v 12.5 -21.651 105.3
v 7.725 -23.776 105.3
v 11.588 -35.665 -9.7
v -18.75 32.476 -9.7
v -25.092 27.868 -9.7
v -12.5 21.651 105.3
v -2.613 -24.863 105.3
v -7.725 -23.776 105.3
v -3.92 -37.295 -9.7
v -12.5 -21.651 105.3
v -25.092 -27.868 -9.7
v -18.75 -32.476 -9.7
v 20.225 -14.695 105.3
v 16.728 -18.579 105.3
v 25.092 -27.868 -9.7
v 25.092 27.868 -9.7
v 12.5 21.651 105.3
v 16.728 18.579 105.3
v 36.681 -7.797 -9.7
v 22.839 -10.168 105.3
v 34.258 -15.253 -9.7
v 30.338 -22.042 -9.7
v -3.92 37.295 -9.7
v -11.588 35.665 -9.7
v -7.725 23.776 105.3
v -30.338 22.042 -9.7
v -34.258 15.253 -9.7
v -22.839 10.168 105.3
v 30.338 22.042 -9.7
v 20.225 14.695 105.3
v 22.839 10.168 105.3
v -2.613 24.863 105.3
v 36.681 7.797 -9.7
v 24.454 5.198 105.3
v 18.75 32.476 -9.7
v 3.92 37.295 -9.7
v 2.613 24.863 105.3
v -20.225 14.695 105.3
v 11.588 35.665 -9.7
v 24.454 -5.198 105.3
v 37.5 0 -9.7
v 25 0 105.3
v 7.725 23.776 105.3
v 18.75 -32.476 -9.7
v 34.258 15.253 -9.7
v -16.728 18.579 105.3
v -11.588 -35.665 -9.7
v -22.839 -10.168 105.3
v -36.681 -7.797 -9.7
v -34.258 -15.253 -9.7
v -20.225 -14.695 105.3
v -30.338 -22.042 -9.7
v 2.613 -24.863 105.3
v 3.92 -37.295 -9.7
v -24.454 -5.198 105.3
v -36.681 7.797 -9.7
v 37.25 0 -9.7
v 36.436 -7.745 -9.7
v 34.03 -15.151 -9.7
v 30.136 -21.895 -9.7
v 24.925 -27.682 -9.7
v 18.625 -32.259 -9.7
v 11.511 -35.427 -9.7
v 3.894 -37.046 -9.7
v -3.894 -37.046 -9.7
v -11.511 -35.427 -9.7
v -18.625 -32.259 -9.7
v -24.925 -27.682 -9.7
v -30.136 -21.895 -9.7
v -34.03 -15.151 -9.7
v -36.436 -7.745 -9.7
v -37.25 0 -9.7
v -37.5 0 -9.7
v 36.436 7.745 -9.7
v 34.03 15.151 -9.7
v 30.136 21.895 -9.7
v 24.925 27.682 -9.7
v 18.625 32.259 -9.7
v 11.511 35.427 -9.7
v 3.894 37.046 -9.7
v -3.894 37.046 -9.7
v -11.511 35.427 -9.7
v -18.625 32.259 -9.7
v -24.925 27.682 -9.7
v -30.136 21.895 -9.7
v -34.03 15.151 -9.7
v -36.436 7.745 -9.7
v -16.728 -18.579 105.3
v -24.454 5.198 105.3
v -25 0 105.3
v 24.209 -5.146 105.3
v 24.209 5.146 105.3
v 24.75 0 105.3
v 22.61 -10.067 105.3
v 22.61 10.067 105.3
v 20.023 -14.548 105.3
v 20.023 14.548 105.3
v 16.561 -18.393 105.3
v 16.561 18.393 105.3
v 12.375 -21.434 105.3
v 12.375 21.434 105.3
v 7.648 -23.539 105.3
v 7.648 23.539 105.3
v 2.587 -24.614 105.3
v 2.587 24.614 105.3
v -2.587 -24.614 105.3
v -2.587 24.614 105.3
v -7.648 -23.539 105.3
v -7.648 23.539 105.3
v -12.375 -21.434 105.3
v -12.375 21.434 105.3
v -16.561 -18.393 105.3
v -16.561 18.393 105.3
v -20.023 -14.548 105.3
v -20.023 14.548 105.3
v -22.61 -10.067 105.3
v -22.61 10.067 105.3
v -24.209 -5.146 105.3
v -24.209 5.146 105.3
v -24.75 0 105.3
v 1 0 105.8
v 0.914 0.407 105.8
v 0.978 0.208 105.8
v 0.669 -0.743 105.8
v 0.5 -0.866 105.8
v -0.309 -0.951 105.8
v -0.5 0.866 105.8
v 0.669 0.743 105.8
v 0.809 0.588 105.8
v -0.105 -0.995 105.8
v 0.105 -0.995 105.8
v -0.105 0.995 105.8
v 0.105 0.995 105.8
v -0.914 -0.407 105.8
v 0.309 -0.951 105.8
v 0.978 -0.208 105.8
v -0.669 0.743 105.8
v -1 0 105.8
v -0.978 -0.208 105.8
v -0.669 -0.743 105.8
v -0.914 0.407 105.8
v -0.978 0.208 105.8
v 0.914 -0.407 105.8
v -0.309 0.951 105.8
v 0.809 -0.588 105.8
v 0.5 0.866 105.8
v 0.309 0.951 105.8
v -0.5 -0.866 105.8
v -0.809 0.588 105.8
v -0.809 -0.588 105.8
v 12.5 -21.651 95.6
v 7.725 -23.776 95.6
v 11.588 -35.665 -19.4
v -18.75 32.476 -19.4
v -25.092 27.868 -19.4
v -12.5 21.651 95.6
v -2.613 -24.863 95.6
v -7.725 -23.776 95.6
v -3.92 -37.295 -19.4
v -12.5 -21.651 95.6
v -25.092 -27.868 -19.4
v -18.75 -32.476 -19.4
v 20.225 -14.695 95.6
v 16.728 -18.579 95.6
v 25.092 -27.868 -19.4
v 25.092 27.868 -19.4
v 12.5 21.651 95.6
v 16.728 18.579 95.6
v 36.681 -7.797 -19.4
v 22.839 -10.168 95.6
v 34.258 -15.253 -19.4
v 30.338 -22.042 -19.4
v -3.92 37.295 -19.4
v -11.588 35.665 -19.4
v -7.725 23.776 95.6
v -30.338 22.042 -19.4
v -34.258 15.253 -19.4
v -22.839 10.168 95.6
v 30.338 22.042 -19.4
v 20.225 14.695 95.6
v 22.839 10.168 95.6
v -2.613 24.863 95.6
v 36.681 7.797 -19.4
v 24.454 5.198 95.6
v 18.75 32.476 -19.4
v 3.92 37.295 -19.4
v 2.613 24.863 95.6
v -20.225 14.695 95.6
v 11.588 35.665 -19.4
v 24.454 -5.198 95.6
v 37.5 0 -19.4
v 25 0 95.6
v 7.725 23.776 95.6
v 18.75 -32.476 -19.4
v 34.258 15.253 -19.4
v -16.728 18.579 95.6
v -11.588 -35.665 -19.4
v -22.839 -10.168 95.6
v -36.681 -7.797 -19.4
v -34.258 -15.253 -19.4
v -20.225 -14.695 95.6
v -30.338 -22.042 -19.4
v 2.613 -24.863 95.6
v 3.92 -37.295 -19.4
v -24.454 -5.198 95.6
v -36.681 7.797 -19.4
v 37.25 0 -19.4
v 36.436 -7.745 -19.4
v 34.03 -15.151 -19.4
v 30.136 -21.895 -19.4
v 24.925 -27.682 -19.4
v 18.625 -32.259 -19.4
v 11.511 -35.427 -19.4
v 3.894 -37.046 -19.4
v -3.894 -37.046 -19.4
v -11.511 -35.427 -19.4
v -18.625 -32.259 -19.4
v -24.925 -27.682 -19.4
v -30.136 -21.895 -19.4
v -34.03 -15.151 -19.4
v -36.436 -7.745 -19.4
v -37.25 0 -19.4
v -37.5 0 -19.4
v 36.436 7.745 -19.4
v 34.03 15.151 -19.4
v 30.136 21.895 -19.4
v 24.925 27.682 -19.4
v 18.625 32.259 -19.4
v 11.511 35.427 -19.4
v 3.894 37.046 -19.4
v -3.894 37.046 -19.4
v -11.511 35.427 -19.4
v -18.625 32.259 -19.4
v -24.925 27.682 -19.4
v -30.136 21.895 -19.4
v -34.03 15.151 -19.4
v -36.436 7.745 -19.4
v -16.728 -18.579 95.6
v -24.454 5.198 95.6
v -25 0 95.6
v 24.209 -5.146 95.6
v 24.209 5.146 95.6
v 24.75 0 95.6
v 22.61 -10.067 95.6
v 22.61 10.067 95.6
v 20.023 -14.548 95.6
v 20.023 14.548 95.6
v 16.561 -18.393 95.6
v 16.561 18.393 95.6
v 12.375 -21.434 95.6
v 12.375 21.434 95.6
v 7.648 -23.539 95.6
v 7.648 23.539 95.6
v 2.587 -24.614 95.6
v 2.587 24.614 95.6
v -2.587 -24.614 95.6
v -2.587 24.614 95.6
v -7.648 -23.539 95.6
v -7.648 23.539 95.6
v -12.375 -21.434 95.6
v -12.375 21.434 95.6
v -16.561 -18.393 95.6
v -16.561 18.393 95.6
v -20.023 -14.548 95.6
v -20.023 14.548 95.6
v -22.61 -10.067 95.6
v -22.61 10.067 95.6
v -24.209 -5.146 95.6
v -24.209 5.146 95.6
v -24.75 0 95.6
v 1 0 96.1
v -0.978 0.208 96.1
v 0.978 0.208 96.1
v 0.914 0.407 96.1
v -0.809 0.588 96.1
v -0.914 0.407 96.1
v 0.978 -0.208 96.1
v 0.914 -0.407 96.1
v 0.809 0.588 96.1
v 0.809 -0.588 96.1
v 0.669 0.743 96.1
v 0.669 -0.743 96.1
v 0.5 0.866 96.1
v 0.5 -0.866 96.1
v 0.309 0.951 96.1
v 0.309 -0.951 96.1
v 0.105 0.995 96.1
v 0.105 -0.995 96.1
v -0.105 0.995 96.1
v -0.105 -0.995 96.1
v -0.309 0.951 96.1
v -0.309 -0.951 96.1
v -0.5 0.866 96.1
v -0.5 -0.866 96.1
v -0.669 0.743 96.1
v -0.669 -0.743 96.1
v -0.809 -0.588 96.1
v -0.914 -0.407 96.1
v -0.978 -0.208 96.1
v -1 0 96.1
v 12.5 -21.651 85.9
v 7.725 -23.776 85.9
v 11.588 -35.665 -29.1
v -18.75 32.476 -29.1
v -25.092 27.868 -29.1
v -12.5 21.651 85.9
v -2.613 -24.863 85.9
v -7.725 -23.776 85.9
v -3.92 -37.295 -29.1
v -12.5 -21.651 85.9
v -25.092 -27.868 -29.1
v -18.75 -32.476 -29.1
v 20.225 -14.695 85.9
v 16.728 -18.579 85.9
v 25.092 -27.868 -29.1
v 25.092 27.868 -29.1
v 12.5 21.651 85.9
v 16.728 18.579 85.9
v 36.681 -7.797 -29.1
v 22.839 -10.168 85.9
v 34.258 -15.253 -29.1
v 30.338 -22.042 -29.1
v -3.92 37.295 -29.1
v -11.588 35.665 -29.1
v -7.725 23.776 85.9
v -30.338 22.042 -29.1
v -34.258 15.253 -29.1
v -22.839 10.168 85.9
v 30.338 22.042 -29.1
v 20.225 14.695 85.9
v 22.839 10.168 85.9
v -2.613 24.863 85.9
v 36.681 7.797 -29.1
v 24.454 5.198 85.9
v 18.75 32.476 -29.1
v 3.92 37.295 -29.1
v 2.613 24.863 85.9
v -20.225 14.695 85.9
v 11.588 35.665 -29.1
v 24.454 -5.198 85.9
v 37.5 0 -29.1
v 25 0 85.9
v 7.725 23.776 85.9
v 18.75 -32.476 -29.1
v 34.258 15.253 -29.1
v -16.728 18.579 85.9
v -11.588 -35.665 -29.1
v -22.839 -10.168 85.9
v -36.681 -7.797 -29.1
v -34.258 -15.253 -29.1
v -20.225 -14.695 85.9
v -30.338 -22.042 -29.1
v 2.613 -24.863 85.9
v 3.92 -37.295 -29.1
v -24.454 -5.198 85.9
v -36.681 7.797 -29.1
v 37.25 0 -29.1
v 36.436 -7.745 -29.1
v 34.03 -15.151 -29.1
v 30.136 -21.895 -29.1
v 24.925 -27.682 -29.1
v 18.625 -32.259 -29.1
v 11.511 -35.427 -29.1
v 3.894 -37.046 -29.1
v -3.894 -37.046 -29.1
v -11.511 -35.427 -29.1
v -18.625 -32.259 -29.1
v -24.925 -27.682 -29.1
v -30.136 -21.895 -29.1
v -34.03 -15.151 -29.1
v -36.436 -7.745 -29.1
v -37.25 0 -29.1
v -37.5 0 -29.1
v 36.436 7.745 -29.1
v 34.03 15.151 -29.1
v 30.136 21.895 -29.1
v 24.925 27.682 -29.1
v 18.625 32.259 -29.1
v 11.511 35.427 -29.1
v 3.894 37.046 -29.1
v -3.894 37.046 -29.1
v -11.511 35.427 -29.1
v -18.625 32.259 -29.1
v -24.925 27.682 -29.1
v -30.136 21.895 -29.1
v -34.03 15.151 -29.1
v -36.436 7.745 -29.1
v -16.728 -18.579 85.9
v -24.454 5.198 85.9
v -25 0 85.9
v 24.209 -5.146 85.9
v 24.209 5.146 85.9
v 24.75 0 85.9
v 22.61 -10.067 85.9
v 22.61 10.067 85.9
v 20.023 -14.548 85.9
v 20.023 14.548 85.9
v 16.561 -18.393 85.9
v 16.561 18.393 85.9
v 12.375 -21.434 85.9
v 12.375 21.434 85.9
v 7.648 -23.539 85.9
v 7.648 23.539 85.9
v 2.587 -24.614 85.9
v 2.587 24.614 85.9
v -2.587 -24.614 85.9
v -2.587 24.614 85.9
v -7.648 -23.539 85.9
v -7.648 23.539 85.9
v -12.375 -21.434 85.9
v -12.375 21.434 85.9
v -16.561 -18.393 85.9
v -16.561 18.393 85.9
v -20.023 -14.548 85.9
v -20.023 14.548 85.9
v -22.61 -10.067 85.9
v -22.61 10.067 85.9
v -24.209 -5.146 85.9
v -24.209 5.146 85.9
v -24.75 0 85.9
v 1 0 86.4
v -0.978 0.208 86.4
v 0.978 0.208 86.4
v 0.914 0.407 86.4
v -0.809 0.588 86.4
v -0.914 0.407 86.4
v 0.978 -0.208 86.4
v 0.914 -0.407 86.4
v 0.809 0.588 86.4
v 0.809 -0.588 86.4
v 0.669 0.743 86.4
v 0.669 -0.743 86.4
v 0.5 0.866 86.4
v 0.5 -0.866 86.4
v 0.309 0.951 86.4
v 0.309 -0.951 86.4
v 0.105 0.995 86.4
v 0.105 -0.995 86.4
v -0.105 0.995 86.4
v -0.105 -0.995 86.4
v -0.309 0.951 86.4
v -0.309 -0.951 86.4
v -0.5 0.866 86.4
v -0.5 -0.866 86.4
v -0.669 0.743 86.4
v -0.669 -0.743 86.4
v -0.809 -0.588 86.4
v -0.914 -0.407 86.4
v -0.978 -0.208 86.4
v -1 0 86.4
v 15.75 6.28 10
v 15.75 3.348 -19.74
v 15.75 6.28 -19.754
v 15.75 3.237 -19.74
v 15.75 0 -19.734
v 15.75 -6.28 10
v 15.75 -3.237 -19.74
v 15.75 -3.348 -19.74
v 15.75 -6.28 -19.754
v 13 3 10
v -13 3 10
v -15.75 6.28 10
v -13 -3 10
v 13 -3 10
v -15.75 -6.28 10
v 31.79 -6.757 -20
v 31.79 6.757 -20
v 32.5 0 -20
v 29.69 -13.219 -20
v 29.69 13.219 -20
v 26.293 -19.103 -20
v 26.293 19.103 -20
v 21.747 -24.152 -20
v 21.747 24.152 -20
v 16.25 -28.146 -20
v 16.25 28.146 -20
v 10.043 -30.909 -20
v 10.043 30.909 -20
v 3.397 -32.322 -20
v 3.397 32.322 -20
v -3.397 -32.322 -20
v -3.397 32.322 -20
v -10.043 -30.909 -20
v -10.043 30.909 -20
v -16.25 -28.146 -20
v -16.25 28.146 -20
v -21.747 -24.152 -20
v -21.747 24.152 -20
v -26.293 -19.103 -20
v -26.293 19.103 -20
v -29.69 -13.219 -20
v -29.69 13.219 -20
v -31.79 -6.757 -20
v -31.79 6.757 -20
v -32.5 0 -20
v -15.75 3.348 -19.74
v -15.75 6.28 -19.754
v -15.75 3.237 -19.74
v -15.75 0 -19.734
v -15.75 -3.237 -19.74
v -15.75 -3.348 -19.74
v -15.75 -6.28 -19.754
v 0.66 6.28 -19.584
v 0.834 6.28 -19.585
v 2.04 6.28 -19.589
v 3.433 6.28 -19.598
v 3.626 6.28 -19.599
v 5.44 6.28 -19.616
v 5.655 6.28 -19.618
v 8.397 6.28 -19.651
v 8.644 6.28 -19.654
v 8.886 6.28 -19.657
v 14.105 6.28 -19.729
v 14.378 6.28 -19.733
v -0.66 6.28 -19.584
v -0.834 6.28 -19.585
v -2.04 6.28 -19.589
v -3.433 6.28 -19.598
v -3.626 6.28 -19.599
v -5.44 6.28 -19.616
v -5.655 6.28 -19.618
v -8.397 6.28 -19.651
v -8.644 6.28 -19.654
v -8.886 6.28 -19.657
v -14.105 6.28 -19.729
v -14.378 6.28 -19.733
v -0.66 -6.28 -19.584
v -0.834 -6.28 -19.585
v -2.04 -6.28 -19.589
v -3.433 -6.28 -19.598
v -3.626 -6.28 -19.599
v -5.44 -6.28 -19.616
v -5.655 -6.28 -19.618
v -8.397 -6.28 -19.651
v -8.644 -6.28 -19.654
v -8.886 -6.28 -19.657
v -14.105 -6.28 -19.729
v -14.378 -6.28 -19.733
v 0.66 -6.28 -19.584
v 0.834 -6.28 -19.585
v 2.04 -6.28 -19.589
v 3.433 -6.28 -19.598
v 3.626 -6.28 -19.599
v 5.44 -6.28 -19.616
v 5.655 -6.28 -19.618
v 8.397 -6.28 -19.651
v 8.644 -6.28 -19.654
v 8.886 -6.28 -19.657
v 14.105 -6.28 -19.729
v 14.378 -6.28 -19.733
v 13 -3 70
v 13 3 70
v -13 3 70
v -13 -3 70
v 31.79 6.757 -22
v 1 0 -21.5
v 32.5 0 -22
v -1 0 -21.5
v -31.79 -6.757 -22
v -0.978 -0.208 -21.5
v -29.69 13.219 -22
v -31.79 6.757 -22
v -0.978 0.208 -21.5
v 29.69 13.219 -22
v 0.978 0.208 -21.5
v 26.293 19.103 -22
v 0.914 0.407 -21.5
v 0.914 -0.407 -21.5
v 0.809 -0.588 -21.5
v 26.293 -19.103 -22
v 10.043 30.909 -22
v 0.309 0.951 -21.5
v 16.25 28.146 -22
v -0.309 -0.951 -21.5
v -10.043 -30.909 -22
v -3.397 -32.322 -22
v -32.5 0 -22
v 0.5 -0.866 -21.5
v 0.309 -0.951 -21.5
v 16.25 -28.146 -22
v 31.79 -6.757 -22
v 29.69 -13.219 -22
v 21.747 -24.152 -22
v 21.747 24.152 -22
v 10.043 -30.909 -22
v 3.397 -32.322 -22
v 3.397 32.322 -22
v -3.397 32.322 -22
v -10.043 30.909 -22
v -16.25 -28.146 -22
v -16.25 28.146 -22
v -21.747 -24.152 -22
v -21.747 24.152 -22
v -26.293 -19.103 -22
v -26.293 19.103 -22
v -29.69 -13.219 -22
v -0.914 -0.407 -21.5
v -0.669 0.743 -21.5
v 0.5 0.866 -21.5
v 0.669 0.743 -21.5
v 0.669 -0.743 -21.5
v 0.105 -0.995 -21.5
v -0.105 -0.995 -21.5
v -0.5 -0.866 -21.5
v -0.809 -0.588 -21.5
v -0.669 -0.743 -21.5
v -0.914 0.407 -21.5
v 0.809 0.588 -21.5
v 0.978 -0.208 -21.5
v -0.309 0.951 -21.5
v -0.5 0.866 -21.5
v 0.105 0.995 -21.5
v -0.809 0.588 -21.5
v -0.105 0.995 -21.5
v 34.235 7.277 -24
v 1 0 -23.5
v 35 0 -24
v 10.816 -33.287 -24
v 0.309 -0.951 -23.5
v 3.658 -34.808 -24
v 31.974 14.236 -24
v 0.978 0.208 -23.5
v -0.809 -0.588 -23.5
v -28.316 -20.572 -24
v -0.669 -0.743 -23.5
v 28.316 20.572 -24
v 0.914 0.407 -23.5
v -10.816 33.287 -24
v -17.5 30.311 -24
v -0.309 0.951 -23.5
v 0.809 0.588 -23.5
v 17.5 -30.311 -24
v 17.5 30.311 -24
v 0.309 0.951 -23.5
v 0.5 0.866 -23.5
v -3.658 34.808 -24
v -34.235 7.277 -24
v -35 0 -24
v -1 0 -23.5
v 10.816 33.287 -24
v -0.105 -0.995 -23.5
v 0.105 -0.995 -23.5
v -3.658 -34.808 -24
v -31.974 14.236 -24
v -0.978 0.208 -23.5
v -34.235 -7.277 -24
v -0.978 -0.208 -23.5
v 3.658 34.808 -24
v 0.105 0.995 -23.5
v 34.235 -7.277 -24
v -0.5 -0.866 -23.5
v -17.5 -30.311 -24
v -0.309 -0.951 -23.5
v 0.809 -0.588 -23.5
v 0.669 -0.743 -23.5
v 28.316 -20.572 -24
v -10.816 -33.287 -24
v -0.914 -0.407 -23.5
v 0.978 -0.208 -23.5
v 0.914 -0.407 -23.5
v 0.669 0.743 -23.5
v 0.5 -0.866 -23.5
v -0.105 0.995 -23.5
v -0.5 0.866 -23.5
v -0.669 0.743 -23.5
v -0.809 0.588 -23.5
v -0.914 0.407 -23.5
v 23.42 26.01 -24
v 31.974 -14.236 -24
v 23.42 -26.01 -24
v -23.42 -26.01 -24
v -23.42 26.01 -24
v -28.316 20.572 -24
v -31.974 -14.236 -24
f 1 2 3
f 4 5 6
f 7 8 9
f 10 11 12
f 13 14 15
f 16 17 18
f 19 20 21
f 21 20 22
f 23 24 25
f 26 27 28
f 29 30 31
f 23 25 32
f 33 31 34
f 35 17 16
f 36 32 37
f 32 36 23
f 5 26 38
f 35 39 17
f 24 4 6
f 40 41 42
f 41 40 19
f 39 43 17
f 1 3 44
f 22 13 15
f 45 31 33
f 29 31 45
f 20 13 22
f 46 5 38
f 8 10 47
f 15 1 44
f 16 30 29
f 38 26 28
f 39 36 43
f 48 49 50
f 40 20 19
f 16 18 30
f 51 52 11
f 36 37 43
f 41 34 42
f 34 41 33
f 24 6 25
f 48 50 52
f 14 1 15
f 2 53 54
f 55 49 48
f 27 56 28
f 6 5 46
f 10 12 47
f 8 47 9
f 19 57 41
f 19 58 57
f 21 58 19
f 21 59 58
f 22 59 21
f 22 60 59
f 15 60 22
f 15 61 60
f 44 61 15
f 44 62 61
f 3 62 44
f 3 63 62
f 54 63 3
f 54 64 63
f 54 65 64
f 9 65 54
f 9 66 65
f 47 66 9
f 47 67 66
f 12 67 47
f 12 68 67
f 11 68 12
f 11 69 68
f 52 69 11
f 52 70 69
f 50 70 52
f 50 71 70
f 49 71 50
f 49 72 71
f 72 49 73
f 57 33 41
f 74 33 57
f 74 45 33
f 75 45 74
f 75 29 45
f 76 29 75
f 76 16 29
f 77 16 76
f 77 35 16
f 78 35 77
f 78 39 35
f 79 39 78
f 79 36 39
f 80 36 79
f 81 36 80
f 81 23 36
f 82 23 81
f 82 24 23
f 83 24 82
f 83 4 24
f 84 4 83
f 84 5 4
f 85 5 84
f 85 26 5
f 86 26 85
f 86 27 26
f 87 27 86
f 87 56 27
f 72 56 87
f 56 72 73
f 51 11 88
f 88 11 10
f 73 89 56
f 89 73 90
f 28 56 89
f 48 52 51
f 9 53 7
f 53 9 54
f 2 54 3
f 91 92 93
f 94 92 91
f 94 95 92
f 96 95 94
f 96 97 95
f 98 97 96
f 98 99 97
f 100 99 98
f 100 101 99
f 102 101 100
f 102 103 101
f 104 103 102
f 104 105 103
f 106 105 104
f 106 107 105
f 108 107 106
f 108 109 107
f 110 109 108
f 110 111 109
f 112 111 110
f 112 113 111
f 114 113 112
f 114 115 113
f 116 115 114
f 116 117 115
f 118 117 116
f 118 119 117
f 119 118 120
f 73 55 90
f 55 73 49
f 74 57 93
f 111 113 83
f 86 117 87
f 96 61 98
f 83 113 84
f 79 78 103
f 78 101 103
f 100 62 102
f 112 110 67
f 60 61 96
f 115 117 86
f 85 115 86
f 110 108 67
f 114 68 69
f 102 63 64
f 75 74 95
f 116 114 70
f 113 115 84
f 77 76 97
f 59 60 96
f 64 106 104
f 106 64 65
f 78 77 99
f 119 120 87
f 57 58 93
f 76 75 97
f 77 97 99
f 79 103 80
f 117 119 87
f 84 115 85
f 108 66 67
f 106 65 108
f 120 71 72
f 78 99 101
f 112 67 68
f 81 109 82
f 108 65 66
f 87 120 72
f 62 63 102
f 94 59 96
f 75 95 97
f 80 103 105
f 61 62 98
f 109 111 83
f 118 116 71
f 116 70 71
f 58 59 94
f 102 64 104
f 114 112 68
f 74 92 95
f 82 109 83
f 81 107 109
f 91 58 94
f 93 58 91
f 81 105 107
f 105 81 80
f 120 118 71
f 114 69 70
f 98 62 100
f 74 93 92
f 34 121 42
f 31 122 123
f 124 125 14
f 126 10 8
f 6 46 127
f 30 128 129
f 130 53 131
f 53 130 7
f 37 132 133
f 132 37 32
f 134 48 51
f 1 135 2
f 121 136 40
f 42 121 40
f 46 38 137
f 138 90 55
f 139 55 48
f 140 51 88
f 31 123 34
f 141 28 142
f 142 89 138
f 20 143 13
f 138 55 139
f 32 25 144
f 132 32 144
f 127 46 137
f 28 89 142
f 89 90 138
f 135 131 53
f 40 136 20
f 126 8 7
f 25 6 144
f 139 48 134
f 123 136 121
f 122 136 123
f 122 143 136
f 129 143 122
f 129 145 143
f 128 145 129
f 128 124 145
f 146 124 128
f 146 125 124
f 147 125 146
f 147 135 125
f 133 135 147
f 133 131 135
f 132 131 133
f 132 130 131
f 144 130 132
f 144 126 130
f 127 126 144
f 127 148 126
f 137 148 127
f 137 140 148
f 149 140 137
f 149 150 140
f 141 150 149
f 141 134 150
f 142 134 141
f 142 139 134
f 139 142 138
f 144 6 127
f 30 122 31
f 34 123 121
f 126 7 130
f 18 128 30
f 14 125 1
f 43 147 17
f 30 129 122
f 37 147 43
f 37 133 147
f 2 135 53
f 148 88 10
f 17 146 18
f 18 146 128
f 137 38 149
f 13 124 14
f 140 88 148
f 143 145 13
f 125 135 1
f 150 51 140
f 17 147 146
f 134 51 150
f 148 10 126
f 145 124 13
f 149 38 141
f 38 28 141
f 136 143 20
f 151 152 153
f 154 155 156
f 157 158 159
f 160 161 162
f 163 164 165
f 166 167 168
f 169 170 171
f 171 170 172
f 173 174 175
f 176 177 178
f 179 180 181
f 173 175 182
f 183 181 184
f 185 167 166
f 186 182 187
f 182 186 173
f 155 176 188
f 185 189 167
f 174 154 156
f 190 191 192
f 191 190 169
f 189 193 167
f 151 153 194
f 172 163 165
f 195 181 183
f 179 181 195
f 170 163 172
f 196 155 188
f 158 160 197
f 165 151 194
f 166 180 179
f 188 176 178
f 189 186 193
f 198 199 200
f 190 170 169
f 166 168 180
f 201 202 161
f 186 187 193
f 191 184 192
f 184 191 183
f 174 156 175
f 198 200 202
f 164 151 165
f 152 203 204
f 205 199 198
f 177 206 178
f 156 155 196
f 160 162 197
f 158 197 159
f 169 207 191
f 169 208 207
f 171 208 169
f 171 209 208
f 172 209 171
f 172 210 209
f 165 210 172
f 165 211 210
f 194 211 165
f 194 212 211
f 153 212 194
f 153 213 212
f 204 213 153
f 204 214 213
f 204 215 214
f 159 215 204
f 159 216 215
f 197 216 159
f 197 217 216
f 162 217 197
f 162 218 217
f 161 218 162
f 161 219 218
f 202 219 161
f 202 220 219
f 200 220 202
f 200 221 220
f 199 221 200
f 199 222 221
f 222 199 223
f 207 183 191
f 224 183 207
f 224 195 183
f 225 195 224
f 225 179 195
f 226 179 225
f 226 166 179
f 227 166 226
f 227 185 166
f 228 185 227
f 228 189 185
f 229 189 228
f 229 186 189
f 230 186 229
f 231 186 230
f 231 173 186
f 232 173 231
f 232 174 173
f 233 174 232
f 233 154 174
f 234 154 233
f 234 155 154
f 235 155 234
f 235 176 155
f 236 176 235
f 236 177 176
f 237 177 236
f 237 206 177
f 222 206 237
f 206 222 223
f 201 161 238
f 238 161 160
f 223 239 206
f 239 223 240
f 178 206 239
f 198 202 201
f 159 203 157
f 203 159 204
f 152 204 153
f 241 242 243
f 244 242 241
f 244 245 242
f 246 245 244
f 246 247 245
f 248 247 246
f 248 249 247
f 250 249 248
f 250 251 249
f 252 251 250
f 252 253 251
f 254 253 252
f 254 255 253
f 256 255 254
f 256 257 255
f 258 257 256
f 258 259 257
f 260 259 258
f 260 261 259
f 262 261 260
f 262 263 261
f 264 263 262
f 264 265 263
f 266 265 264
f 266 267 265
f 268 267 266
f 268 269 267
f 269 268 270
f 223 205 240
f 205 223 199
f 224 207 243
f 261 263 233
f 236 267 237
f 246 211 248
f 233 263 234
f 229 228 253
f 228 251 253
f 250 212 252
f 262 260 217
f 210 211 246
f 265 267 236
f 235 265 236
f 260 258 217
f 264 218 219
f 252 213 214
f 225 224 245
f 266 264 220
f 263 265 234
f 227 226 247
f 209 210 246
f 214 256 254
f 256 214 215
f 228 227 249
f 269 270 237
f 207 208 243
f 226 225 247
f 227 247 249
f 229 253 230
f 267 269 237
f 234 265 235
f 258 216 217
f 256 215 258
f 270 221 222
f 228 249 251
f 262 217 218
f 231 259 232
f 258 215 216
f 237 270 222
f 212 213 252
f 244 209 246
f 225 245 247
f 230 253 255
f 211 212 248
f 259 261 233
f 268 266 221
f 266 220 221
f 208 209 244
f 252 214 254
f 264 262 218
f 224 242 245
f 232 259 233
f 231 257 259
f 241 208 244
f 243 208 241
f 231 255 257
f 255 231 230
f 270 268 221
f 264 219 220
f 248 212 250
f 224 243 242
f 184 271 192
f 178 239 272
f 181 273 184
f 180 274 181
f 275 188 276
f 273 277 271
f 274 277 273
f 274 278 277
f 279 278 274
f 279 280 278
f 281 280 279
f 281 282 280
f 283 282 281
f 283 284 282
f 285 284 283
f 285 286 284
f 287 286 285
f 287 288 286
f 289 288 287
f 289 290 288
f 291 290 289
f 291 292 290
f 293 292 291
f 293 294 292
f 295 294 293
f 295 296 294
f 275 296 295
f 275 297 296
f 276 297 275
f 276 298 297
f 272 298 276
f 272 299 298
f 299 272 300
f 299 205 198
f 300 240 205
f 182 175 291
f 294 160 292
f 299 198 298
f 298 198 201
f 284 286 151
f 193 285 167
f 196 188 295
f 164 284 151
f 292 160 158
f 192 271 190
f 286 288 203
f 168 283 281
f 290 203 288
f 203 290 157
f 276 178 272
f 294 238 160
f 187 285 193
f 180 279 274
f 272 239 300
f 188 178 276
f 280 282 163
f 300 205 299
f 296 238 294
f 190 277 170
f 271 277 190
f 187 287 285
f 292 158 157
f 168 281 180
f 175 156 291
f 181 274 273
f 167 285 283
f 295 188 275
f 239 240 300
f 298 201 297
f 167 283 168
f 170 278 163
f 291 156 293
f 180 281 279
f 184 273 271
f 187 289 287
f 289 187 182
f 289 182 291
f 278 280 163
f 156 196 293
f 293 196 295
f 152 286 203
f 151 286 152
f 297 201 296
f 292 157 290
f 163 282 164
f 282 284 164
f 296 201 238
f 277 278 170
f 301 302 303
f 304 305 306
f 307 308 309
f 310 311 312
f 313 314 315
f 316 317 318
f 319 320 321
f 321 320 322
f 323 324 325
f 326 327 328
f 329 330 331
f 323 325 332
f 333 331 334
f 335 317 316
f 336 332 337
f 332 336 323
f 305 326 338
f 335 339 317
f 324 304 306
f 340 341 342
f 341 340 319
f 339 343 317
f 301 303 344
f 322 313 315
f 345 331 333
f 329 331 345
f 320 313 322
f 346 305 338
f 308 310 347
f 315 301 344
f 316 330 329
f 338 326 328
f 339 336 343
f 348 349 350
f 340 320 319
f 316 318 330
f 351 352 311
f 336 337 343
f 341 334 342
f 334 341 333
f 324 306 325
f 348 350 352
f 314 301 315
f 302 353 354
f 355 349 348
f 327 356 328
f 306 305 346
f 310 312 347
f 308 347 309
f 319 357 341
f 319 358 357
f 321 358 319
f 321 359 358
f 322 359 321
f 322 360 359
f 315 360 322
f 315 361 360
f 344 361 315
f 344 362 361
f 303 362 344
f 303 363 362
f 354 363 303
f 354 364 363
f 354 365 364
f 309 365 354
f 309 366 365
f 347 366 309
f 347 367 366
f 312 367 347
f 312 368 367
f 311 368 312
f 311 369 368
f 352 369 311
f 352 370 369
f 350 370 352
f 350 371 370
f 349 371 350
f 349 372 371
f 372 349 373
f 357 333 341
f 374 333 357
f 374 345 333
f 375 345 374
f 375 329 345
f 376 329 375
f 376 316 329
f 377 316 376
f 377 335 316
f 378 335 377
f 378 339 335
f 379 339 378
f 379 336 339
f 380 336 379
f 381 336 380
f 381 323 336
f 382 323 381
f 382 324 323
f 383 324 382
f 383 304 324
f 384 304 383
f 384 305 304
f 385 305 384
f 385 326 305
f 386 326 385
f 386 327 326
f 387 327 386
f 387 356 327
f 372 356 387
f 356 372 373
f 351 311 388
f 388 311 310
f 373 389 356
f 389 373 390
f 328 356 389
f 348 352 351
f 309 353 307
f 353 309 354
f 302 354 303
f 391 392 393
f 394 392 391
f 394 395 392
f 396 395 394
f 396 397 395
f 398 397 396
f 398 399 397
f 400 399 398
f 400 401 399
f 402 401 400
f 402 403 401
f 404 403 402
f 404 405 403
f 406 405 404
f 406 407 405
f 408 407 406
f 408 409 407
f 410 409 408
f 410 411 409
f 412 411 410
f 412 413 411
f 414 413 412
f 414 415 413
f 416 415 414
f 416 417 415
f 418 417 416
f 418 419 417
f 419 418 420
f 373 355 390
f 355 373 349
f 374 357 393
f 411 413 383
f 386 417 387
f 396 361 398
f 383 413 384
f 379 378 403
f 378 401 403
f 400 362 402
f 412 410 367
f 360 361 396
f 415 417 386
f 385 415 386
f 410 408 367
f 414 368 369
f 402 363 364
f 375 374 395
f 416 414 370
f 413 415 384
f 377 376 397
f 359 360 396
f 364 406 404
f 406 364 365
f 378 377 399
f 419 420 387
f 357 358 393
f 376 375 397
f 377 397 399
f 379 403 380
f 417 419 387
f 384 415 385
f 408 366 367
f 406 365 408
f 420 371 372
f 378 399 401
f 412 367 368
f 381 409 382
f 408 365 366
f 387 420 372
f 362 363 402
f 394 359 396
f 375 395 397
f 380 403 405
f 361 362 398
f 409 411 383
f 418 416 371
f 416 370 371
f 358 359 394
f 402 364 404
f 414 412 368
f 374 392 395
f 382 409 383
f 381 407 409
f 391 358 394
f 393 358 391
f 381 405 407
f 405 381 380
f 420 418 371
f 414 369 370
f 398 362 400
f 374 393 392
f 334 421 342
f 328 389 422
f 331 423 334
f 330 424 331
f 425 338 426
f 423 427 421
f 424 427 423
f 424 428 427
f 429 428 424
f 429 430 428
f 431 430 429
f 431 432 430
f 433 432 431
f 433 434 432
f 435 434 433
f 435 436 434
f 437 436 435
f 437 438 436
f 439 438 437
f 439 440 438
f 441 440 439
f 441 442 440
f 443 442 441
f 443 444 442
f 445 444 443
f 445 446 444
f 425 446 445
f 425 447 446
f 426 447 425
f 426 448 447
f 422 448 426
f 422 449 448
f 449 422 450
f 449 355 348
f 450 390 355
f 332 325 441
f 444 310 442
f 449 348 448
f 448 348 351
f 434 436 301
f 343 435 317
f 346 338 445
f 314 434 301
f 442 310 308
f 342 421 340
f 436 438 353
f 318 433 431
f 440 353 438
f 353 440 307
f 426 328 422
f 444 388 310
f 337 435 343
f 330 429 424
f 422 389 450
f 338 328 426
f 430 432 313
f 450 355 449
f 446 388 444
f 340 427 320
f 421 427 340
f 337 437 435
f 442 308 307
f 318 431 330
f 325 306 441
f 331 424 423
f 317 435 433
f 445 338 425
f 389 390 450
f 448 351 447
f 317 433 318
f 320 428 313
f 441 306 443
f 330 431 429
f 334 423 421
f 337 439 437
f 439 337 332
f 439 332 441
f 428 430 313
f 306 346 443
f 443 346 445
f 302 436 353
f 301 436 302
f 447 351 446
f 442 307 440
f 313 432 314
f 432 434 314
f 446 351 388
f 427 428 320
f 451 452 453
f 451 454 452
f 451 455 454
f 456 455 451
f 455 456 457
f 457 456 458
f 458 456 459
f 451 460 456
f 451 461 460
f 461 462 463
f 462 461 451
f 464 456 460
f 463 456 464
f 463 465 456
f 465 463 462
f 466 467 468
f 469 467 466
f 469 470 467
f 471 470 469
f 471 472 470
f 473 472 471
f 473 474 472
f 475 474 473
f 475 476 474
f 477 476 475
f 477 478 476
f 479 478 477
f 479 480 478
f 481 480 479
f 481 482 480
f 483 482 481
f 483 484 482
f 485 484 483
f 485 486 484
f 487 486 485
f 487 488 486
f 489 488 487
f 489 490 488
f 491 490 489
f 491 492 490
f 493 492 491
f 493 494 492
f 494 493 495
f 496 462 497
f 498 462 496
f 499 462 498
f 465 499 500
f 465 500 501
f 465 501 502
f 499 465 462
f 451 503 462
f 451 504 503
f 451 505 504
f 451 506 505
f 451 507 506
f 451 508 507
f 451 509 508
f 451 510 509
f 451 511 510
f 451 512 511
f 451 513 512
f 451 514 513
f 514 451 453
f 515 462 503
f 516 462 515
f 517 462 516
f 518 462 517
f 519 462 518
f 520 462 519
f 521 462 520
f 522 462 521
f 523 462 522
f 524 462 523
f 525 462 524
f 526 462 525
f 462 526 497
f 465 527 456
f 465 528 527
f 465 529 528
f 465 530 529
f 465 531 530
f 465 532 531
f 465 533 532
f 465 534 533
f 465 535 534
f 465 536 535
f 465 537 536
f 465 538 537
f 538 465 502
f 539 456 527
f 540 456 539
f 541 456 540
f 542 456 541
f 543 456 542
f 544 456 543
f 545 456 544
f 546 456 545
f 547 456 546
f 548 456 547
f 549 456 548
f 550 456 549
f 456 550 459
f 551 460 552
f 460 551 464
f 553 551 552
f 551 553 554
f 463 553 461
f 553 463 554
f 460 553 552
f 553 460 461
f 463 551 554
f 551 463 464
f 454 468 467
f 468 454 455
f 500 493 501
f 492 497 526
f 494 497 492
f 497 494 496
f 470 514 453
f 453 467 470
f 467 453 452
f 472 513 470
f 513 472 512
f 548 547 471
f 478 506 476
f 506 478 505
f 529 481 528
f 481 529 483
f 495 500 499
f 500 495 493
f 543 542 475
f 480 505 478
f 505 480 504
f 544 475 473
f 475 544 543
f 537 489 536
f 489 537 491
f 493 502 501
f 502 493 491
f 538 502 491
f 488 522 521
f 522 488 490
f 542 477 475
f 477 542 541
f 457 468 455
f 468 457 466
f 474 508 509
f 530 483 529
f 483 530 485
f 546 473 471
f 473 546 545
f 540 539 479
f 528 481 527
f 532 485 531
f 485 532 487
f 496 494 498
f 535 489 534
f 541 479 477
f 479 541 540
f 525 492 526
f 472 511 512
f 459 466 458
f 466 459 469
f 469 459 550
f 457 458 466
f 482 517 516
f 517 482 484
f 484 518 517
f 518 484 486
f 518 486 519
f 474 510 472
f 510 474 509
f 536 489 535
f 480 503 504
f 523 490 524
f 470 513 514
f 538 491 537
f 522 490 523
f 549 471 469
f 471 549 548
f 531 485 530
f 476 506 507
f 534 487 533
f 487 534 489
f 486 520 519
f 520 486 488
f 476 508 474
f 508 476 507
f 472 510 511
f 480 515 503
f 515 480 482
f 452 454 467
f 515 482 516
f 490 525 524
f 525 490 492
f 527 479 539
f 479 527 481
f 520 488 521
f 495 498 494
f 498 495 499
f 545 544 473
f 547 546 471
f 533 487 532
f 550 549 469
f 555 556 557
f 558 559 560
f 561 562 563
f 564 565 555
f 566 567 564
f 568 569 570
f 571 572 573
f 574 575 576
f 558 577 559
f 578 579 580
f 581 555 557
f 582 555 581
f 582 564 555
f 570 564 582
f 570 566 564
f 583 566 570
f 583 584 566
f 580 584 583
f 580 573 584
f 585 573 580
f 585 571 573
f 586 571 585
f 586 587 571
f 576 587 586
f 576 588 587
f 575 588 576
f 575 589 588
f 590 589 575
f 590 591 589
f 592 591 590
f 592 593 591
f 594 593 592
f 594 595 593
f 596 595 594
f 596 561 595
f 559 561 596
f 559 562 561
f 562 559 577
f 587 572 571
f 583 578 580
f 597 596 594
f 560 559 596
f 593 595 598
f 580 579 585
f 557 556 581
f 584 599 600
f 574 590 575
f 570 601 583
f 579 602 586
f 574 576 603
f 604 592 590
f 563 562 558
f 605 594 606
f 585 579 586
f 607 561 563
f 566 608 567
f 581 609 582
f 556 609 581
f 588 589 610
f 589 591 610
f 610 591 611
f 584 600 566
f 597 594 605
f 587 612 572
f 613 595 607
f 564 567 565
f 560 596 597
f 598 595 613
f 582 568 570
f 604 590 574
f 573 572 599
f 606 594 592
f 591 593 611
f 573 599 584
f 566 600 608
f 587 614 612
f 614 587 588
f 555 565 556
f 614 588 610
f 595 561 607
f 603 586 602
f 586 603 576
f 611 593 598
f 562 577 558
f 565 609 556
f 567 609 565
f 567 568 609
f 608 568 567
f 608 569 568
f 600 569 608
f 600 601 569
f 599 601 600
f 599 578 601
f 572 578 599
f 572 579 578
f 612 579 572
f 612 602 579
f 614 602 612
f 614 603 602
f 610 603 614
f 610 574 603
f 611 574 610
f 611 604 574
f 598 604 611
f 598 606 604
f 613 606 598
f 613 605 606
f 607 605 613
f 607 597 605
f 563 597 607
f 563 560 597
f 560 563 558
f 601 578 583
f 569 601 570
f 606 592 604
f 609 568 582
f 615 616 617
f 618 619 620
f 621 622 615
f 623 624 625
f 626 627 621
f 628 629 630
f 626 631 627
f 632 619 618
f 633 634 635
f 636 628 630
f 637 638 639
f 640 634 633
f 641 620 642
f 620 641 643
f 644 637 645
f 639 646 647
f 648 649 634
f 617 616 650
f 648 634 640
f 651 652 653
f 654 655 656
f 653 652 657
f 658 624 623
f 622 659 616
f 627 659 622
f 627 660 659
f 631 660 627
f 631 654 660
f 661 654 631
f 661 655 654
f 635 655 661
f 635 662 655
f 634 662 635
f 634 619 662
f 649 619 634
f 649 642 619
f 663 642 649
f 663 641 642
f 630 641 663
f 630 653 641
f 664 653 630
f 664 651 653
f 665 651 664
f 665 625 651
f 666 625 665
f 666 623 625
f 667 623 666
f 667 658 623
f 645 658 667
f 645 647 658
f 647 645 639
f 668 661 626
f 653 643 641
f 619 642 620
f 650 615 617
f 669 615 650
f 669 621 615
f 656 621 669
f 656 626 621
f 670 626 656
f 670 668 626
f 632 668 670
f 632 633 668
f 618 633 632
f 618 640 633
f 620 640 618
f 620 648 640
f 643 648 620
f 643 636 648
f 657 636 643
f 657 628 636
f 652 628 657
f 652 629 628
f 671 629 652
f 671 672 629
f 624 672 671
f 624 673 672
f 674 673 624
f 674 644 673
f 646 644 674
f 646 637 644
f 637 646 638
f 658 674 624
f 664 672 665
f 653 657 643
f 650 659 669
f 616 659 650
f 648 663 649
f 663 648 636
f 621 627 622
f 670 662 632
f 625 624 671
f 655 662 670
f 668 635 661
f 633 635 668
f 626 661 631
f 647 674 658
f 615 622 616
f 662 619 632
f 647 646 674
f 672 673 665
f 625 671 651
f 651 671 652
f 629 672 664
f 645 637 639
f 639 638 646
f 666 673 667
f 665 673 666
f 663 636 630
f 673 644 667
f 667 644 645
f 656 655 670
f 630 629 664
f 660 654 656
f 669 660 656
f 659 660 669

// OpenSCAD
$fn = 30;

CONE_OD_1 = 75;
CONE_OD_2 = 50;

cone_thickness = 0.5;

NUM_CONES  = 3;

cone_height = 115;
cone_gap = 1;

cone_angle = asin(((CONE_OD_1 - CONE_OD_2)/2)/cone_height);
echo(cone_angle);
base_correction = sin(cone_angle)*cone_thickness;

echo(cone_height-NUM_CONES*(cone_thickness+(cone_gap/sin(cone_angle))));


//intersection(){
   // cylinder(h=cone_height-NUM_CONES*(cone_thickness+(cone_gap/sin(cone_angle))),d=CONE_OD_1);
    for(i = [1:NUM_CONES]){
        translate([0,0,-i*(cone_thickness+(cone_gap/sin(cone_angle)))]){
            translate([0,0,cone_height]){cylinder(cone_thickness,d1=CONE_OD_2);}
            difference(){
                
            cylinder(cone_height,d1=CONE_OD_1,d2=CONE_OD_2);
            cylinder(cone_height,d1=CONE_OD_1-cone_thickness,
                                                d2=CONE_OD_2-cone_thickness); 
                                                
            }
        }
    }
//}

translate([0,0,-5]){
    translate([0,0,0]){cube([31.5,12.56,30], center=true);}
    translate([0,0,15+30]){cube([26,6,60], center=true);}
}

translate([0,0,-20]){cylinder(cone_thickness,d1=65);}
translate([0,0,-22]){cylinder(cone_thickness,d1=65);}
translate([0,0,-24]){cylinder(cone_thickness,d1=70);}
